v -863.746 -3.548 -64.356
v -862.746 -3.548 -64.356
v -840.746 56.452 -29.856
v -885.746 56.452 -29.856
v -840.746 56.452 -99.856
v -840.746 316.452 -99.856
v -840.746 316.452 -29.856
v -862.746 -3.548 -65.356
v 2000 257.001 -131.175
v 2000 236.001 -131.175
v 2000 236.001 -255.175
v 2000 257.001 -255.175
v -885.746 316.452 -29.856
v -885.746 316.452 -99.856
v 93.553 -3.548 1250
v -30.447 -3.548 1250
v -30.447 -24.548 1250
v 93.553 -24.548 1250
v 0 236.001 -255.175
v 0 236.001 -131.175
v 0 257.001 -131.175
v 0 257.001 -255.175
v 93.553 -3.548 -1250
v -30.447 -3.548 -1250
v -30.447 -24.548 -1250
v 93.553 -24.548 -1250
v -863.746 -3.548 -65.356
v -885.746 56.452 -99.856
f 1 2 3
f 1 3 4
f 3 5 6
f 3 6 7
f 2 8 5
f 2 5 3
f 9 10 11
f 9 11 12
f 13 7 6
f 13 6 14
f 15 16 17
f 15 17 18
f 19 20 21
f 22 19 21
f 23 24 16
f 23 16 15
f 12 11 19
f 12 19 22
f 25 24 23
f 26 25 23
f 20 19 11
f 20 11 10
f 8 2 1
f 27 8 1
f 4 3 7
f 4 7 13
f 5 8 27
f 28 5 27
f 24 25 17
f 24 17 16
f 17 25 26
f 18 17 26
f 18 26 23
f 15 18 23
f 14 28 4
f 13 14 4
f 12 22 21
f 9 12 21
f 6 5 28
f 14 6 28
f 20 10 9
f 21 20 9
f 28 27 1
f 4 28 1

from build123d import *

# Parameters (mm, degrees)
F0_W     = 124
F0_H     = 21
F1_DEPTH = 1250
F2_W     = 45
F2_H     = 70
F3_DEPTH = 320
F4_SIZE2 = 60
F4_SIZE  = 22
F5_SIZE2 = 60
F5_SIZE  = 34.5
F6_W     = 21
F6_H     = 124
F7_DEPTH = 2000


with BuildPart() as f1:
    # F0 (on Top) → F1 (new body, symmetric)
    with BuildSketch(Plane.XY):
        with Locations((31.553287496, -14.0481669903)):
            Rectangle(F0_W, F0_H)
    extrude(amount=F1_DEPTH, both=True)


with BuildPart() as f3:
    # F2 (on face) → F3 (new body)
    with BuildSketch(Plane(origin=(0, -3.5481669903, 0), x_dir=(-1, 0, 0), z_dir=(0, 1, 0))):
        with Locations((863.2462115258, -64.8556835949)):
            Rectangle(F2_W, F2_H)
    extrude(amount=F3_DEPTH)

    # F4
    f4_edges = [f3.edges().sort_by_distance(p)[0] for p in [
        (-840.746212, -3.548167, -64.855684),
        (-885.746212, -3.548167, -64.855684),
    ]]
    f4_side = f3.faces().sort_by_distance((-863.246212, -3.548167, -64.855684))[0]
    chamfer(f4_edges, length=F4_SIZE, length2=F4_SIZE2, reference=f4_side)

    # F5
    f5_edges = [f3.edges().sort_by_distance(p)[0] for p in [
        (-863.246212, -3.548167, -99.855684),
        (-863.246212, -3.548167, -29.855684),
    ]]
    f5_side = f3.faces().sort_by_distance((-863.246212, -3.548167, -64.855684))[0]
    chamfer(f5_edges, length=F5_SIZE, length2=F5_SIZE2, reference=f5_side)


with BuildPart() as f7:
    # F6 (on Right) → F7 (new body)
    with BuildSketch(Plane.YZ):
        with Locations((246.501280446, -193.1747496128)):
            Rectangle(F6_W, F6_H)
    extrude(amount=F7_DEPTH)


solid = Compound([f1.part, f3.part, f7.part])
